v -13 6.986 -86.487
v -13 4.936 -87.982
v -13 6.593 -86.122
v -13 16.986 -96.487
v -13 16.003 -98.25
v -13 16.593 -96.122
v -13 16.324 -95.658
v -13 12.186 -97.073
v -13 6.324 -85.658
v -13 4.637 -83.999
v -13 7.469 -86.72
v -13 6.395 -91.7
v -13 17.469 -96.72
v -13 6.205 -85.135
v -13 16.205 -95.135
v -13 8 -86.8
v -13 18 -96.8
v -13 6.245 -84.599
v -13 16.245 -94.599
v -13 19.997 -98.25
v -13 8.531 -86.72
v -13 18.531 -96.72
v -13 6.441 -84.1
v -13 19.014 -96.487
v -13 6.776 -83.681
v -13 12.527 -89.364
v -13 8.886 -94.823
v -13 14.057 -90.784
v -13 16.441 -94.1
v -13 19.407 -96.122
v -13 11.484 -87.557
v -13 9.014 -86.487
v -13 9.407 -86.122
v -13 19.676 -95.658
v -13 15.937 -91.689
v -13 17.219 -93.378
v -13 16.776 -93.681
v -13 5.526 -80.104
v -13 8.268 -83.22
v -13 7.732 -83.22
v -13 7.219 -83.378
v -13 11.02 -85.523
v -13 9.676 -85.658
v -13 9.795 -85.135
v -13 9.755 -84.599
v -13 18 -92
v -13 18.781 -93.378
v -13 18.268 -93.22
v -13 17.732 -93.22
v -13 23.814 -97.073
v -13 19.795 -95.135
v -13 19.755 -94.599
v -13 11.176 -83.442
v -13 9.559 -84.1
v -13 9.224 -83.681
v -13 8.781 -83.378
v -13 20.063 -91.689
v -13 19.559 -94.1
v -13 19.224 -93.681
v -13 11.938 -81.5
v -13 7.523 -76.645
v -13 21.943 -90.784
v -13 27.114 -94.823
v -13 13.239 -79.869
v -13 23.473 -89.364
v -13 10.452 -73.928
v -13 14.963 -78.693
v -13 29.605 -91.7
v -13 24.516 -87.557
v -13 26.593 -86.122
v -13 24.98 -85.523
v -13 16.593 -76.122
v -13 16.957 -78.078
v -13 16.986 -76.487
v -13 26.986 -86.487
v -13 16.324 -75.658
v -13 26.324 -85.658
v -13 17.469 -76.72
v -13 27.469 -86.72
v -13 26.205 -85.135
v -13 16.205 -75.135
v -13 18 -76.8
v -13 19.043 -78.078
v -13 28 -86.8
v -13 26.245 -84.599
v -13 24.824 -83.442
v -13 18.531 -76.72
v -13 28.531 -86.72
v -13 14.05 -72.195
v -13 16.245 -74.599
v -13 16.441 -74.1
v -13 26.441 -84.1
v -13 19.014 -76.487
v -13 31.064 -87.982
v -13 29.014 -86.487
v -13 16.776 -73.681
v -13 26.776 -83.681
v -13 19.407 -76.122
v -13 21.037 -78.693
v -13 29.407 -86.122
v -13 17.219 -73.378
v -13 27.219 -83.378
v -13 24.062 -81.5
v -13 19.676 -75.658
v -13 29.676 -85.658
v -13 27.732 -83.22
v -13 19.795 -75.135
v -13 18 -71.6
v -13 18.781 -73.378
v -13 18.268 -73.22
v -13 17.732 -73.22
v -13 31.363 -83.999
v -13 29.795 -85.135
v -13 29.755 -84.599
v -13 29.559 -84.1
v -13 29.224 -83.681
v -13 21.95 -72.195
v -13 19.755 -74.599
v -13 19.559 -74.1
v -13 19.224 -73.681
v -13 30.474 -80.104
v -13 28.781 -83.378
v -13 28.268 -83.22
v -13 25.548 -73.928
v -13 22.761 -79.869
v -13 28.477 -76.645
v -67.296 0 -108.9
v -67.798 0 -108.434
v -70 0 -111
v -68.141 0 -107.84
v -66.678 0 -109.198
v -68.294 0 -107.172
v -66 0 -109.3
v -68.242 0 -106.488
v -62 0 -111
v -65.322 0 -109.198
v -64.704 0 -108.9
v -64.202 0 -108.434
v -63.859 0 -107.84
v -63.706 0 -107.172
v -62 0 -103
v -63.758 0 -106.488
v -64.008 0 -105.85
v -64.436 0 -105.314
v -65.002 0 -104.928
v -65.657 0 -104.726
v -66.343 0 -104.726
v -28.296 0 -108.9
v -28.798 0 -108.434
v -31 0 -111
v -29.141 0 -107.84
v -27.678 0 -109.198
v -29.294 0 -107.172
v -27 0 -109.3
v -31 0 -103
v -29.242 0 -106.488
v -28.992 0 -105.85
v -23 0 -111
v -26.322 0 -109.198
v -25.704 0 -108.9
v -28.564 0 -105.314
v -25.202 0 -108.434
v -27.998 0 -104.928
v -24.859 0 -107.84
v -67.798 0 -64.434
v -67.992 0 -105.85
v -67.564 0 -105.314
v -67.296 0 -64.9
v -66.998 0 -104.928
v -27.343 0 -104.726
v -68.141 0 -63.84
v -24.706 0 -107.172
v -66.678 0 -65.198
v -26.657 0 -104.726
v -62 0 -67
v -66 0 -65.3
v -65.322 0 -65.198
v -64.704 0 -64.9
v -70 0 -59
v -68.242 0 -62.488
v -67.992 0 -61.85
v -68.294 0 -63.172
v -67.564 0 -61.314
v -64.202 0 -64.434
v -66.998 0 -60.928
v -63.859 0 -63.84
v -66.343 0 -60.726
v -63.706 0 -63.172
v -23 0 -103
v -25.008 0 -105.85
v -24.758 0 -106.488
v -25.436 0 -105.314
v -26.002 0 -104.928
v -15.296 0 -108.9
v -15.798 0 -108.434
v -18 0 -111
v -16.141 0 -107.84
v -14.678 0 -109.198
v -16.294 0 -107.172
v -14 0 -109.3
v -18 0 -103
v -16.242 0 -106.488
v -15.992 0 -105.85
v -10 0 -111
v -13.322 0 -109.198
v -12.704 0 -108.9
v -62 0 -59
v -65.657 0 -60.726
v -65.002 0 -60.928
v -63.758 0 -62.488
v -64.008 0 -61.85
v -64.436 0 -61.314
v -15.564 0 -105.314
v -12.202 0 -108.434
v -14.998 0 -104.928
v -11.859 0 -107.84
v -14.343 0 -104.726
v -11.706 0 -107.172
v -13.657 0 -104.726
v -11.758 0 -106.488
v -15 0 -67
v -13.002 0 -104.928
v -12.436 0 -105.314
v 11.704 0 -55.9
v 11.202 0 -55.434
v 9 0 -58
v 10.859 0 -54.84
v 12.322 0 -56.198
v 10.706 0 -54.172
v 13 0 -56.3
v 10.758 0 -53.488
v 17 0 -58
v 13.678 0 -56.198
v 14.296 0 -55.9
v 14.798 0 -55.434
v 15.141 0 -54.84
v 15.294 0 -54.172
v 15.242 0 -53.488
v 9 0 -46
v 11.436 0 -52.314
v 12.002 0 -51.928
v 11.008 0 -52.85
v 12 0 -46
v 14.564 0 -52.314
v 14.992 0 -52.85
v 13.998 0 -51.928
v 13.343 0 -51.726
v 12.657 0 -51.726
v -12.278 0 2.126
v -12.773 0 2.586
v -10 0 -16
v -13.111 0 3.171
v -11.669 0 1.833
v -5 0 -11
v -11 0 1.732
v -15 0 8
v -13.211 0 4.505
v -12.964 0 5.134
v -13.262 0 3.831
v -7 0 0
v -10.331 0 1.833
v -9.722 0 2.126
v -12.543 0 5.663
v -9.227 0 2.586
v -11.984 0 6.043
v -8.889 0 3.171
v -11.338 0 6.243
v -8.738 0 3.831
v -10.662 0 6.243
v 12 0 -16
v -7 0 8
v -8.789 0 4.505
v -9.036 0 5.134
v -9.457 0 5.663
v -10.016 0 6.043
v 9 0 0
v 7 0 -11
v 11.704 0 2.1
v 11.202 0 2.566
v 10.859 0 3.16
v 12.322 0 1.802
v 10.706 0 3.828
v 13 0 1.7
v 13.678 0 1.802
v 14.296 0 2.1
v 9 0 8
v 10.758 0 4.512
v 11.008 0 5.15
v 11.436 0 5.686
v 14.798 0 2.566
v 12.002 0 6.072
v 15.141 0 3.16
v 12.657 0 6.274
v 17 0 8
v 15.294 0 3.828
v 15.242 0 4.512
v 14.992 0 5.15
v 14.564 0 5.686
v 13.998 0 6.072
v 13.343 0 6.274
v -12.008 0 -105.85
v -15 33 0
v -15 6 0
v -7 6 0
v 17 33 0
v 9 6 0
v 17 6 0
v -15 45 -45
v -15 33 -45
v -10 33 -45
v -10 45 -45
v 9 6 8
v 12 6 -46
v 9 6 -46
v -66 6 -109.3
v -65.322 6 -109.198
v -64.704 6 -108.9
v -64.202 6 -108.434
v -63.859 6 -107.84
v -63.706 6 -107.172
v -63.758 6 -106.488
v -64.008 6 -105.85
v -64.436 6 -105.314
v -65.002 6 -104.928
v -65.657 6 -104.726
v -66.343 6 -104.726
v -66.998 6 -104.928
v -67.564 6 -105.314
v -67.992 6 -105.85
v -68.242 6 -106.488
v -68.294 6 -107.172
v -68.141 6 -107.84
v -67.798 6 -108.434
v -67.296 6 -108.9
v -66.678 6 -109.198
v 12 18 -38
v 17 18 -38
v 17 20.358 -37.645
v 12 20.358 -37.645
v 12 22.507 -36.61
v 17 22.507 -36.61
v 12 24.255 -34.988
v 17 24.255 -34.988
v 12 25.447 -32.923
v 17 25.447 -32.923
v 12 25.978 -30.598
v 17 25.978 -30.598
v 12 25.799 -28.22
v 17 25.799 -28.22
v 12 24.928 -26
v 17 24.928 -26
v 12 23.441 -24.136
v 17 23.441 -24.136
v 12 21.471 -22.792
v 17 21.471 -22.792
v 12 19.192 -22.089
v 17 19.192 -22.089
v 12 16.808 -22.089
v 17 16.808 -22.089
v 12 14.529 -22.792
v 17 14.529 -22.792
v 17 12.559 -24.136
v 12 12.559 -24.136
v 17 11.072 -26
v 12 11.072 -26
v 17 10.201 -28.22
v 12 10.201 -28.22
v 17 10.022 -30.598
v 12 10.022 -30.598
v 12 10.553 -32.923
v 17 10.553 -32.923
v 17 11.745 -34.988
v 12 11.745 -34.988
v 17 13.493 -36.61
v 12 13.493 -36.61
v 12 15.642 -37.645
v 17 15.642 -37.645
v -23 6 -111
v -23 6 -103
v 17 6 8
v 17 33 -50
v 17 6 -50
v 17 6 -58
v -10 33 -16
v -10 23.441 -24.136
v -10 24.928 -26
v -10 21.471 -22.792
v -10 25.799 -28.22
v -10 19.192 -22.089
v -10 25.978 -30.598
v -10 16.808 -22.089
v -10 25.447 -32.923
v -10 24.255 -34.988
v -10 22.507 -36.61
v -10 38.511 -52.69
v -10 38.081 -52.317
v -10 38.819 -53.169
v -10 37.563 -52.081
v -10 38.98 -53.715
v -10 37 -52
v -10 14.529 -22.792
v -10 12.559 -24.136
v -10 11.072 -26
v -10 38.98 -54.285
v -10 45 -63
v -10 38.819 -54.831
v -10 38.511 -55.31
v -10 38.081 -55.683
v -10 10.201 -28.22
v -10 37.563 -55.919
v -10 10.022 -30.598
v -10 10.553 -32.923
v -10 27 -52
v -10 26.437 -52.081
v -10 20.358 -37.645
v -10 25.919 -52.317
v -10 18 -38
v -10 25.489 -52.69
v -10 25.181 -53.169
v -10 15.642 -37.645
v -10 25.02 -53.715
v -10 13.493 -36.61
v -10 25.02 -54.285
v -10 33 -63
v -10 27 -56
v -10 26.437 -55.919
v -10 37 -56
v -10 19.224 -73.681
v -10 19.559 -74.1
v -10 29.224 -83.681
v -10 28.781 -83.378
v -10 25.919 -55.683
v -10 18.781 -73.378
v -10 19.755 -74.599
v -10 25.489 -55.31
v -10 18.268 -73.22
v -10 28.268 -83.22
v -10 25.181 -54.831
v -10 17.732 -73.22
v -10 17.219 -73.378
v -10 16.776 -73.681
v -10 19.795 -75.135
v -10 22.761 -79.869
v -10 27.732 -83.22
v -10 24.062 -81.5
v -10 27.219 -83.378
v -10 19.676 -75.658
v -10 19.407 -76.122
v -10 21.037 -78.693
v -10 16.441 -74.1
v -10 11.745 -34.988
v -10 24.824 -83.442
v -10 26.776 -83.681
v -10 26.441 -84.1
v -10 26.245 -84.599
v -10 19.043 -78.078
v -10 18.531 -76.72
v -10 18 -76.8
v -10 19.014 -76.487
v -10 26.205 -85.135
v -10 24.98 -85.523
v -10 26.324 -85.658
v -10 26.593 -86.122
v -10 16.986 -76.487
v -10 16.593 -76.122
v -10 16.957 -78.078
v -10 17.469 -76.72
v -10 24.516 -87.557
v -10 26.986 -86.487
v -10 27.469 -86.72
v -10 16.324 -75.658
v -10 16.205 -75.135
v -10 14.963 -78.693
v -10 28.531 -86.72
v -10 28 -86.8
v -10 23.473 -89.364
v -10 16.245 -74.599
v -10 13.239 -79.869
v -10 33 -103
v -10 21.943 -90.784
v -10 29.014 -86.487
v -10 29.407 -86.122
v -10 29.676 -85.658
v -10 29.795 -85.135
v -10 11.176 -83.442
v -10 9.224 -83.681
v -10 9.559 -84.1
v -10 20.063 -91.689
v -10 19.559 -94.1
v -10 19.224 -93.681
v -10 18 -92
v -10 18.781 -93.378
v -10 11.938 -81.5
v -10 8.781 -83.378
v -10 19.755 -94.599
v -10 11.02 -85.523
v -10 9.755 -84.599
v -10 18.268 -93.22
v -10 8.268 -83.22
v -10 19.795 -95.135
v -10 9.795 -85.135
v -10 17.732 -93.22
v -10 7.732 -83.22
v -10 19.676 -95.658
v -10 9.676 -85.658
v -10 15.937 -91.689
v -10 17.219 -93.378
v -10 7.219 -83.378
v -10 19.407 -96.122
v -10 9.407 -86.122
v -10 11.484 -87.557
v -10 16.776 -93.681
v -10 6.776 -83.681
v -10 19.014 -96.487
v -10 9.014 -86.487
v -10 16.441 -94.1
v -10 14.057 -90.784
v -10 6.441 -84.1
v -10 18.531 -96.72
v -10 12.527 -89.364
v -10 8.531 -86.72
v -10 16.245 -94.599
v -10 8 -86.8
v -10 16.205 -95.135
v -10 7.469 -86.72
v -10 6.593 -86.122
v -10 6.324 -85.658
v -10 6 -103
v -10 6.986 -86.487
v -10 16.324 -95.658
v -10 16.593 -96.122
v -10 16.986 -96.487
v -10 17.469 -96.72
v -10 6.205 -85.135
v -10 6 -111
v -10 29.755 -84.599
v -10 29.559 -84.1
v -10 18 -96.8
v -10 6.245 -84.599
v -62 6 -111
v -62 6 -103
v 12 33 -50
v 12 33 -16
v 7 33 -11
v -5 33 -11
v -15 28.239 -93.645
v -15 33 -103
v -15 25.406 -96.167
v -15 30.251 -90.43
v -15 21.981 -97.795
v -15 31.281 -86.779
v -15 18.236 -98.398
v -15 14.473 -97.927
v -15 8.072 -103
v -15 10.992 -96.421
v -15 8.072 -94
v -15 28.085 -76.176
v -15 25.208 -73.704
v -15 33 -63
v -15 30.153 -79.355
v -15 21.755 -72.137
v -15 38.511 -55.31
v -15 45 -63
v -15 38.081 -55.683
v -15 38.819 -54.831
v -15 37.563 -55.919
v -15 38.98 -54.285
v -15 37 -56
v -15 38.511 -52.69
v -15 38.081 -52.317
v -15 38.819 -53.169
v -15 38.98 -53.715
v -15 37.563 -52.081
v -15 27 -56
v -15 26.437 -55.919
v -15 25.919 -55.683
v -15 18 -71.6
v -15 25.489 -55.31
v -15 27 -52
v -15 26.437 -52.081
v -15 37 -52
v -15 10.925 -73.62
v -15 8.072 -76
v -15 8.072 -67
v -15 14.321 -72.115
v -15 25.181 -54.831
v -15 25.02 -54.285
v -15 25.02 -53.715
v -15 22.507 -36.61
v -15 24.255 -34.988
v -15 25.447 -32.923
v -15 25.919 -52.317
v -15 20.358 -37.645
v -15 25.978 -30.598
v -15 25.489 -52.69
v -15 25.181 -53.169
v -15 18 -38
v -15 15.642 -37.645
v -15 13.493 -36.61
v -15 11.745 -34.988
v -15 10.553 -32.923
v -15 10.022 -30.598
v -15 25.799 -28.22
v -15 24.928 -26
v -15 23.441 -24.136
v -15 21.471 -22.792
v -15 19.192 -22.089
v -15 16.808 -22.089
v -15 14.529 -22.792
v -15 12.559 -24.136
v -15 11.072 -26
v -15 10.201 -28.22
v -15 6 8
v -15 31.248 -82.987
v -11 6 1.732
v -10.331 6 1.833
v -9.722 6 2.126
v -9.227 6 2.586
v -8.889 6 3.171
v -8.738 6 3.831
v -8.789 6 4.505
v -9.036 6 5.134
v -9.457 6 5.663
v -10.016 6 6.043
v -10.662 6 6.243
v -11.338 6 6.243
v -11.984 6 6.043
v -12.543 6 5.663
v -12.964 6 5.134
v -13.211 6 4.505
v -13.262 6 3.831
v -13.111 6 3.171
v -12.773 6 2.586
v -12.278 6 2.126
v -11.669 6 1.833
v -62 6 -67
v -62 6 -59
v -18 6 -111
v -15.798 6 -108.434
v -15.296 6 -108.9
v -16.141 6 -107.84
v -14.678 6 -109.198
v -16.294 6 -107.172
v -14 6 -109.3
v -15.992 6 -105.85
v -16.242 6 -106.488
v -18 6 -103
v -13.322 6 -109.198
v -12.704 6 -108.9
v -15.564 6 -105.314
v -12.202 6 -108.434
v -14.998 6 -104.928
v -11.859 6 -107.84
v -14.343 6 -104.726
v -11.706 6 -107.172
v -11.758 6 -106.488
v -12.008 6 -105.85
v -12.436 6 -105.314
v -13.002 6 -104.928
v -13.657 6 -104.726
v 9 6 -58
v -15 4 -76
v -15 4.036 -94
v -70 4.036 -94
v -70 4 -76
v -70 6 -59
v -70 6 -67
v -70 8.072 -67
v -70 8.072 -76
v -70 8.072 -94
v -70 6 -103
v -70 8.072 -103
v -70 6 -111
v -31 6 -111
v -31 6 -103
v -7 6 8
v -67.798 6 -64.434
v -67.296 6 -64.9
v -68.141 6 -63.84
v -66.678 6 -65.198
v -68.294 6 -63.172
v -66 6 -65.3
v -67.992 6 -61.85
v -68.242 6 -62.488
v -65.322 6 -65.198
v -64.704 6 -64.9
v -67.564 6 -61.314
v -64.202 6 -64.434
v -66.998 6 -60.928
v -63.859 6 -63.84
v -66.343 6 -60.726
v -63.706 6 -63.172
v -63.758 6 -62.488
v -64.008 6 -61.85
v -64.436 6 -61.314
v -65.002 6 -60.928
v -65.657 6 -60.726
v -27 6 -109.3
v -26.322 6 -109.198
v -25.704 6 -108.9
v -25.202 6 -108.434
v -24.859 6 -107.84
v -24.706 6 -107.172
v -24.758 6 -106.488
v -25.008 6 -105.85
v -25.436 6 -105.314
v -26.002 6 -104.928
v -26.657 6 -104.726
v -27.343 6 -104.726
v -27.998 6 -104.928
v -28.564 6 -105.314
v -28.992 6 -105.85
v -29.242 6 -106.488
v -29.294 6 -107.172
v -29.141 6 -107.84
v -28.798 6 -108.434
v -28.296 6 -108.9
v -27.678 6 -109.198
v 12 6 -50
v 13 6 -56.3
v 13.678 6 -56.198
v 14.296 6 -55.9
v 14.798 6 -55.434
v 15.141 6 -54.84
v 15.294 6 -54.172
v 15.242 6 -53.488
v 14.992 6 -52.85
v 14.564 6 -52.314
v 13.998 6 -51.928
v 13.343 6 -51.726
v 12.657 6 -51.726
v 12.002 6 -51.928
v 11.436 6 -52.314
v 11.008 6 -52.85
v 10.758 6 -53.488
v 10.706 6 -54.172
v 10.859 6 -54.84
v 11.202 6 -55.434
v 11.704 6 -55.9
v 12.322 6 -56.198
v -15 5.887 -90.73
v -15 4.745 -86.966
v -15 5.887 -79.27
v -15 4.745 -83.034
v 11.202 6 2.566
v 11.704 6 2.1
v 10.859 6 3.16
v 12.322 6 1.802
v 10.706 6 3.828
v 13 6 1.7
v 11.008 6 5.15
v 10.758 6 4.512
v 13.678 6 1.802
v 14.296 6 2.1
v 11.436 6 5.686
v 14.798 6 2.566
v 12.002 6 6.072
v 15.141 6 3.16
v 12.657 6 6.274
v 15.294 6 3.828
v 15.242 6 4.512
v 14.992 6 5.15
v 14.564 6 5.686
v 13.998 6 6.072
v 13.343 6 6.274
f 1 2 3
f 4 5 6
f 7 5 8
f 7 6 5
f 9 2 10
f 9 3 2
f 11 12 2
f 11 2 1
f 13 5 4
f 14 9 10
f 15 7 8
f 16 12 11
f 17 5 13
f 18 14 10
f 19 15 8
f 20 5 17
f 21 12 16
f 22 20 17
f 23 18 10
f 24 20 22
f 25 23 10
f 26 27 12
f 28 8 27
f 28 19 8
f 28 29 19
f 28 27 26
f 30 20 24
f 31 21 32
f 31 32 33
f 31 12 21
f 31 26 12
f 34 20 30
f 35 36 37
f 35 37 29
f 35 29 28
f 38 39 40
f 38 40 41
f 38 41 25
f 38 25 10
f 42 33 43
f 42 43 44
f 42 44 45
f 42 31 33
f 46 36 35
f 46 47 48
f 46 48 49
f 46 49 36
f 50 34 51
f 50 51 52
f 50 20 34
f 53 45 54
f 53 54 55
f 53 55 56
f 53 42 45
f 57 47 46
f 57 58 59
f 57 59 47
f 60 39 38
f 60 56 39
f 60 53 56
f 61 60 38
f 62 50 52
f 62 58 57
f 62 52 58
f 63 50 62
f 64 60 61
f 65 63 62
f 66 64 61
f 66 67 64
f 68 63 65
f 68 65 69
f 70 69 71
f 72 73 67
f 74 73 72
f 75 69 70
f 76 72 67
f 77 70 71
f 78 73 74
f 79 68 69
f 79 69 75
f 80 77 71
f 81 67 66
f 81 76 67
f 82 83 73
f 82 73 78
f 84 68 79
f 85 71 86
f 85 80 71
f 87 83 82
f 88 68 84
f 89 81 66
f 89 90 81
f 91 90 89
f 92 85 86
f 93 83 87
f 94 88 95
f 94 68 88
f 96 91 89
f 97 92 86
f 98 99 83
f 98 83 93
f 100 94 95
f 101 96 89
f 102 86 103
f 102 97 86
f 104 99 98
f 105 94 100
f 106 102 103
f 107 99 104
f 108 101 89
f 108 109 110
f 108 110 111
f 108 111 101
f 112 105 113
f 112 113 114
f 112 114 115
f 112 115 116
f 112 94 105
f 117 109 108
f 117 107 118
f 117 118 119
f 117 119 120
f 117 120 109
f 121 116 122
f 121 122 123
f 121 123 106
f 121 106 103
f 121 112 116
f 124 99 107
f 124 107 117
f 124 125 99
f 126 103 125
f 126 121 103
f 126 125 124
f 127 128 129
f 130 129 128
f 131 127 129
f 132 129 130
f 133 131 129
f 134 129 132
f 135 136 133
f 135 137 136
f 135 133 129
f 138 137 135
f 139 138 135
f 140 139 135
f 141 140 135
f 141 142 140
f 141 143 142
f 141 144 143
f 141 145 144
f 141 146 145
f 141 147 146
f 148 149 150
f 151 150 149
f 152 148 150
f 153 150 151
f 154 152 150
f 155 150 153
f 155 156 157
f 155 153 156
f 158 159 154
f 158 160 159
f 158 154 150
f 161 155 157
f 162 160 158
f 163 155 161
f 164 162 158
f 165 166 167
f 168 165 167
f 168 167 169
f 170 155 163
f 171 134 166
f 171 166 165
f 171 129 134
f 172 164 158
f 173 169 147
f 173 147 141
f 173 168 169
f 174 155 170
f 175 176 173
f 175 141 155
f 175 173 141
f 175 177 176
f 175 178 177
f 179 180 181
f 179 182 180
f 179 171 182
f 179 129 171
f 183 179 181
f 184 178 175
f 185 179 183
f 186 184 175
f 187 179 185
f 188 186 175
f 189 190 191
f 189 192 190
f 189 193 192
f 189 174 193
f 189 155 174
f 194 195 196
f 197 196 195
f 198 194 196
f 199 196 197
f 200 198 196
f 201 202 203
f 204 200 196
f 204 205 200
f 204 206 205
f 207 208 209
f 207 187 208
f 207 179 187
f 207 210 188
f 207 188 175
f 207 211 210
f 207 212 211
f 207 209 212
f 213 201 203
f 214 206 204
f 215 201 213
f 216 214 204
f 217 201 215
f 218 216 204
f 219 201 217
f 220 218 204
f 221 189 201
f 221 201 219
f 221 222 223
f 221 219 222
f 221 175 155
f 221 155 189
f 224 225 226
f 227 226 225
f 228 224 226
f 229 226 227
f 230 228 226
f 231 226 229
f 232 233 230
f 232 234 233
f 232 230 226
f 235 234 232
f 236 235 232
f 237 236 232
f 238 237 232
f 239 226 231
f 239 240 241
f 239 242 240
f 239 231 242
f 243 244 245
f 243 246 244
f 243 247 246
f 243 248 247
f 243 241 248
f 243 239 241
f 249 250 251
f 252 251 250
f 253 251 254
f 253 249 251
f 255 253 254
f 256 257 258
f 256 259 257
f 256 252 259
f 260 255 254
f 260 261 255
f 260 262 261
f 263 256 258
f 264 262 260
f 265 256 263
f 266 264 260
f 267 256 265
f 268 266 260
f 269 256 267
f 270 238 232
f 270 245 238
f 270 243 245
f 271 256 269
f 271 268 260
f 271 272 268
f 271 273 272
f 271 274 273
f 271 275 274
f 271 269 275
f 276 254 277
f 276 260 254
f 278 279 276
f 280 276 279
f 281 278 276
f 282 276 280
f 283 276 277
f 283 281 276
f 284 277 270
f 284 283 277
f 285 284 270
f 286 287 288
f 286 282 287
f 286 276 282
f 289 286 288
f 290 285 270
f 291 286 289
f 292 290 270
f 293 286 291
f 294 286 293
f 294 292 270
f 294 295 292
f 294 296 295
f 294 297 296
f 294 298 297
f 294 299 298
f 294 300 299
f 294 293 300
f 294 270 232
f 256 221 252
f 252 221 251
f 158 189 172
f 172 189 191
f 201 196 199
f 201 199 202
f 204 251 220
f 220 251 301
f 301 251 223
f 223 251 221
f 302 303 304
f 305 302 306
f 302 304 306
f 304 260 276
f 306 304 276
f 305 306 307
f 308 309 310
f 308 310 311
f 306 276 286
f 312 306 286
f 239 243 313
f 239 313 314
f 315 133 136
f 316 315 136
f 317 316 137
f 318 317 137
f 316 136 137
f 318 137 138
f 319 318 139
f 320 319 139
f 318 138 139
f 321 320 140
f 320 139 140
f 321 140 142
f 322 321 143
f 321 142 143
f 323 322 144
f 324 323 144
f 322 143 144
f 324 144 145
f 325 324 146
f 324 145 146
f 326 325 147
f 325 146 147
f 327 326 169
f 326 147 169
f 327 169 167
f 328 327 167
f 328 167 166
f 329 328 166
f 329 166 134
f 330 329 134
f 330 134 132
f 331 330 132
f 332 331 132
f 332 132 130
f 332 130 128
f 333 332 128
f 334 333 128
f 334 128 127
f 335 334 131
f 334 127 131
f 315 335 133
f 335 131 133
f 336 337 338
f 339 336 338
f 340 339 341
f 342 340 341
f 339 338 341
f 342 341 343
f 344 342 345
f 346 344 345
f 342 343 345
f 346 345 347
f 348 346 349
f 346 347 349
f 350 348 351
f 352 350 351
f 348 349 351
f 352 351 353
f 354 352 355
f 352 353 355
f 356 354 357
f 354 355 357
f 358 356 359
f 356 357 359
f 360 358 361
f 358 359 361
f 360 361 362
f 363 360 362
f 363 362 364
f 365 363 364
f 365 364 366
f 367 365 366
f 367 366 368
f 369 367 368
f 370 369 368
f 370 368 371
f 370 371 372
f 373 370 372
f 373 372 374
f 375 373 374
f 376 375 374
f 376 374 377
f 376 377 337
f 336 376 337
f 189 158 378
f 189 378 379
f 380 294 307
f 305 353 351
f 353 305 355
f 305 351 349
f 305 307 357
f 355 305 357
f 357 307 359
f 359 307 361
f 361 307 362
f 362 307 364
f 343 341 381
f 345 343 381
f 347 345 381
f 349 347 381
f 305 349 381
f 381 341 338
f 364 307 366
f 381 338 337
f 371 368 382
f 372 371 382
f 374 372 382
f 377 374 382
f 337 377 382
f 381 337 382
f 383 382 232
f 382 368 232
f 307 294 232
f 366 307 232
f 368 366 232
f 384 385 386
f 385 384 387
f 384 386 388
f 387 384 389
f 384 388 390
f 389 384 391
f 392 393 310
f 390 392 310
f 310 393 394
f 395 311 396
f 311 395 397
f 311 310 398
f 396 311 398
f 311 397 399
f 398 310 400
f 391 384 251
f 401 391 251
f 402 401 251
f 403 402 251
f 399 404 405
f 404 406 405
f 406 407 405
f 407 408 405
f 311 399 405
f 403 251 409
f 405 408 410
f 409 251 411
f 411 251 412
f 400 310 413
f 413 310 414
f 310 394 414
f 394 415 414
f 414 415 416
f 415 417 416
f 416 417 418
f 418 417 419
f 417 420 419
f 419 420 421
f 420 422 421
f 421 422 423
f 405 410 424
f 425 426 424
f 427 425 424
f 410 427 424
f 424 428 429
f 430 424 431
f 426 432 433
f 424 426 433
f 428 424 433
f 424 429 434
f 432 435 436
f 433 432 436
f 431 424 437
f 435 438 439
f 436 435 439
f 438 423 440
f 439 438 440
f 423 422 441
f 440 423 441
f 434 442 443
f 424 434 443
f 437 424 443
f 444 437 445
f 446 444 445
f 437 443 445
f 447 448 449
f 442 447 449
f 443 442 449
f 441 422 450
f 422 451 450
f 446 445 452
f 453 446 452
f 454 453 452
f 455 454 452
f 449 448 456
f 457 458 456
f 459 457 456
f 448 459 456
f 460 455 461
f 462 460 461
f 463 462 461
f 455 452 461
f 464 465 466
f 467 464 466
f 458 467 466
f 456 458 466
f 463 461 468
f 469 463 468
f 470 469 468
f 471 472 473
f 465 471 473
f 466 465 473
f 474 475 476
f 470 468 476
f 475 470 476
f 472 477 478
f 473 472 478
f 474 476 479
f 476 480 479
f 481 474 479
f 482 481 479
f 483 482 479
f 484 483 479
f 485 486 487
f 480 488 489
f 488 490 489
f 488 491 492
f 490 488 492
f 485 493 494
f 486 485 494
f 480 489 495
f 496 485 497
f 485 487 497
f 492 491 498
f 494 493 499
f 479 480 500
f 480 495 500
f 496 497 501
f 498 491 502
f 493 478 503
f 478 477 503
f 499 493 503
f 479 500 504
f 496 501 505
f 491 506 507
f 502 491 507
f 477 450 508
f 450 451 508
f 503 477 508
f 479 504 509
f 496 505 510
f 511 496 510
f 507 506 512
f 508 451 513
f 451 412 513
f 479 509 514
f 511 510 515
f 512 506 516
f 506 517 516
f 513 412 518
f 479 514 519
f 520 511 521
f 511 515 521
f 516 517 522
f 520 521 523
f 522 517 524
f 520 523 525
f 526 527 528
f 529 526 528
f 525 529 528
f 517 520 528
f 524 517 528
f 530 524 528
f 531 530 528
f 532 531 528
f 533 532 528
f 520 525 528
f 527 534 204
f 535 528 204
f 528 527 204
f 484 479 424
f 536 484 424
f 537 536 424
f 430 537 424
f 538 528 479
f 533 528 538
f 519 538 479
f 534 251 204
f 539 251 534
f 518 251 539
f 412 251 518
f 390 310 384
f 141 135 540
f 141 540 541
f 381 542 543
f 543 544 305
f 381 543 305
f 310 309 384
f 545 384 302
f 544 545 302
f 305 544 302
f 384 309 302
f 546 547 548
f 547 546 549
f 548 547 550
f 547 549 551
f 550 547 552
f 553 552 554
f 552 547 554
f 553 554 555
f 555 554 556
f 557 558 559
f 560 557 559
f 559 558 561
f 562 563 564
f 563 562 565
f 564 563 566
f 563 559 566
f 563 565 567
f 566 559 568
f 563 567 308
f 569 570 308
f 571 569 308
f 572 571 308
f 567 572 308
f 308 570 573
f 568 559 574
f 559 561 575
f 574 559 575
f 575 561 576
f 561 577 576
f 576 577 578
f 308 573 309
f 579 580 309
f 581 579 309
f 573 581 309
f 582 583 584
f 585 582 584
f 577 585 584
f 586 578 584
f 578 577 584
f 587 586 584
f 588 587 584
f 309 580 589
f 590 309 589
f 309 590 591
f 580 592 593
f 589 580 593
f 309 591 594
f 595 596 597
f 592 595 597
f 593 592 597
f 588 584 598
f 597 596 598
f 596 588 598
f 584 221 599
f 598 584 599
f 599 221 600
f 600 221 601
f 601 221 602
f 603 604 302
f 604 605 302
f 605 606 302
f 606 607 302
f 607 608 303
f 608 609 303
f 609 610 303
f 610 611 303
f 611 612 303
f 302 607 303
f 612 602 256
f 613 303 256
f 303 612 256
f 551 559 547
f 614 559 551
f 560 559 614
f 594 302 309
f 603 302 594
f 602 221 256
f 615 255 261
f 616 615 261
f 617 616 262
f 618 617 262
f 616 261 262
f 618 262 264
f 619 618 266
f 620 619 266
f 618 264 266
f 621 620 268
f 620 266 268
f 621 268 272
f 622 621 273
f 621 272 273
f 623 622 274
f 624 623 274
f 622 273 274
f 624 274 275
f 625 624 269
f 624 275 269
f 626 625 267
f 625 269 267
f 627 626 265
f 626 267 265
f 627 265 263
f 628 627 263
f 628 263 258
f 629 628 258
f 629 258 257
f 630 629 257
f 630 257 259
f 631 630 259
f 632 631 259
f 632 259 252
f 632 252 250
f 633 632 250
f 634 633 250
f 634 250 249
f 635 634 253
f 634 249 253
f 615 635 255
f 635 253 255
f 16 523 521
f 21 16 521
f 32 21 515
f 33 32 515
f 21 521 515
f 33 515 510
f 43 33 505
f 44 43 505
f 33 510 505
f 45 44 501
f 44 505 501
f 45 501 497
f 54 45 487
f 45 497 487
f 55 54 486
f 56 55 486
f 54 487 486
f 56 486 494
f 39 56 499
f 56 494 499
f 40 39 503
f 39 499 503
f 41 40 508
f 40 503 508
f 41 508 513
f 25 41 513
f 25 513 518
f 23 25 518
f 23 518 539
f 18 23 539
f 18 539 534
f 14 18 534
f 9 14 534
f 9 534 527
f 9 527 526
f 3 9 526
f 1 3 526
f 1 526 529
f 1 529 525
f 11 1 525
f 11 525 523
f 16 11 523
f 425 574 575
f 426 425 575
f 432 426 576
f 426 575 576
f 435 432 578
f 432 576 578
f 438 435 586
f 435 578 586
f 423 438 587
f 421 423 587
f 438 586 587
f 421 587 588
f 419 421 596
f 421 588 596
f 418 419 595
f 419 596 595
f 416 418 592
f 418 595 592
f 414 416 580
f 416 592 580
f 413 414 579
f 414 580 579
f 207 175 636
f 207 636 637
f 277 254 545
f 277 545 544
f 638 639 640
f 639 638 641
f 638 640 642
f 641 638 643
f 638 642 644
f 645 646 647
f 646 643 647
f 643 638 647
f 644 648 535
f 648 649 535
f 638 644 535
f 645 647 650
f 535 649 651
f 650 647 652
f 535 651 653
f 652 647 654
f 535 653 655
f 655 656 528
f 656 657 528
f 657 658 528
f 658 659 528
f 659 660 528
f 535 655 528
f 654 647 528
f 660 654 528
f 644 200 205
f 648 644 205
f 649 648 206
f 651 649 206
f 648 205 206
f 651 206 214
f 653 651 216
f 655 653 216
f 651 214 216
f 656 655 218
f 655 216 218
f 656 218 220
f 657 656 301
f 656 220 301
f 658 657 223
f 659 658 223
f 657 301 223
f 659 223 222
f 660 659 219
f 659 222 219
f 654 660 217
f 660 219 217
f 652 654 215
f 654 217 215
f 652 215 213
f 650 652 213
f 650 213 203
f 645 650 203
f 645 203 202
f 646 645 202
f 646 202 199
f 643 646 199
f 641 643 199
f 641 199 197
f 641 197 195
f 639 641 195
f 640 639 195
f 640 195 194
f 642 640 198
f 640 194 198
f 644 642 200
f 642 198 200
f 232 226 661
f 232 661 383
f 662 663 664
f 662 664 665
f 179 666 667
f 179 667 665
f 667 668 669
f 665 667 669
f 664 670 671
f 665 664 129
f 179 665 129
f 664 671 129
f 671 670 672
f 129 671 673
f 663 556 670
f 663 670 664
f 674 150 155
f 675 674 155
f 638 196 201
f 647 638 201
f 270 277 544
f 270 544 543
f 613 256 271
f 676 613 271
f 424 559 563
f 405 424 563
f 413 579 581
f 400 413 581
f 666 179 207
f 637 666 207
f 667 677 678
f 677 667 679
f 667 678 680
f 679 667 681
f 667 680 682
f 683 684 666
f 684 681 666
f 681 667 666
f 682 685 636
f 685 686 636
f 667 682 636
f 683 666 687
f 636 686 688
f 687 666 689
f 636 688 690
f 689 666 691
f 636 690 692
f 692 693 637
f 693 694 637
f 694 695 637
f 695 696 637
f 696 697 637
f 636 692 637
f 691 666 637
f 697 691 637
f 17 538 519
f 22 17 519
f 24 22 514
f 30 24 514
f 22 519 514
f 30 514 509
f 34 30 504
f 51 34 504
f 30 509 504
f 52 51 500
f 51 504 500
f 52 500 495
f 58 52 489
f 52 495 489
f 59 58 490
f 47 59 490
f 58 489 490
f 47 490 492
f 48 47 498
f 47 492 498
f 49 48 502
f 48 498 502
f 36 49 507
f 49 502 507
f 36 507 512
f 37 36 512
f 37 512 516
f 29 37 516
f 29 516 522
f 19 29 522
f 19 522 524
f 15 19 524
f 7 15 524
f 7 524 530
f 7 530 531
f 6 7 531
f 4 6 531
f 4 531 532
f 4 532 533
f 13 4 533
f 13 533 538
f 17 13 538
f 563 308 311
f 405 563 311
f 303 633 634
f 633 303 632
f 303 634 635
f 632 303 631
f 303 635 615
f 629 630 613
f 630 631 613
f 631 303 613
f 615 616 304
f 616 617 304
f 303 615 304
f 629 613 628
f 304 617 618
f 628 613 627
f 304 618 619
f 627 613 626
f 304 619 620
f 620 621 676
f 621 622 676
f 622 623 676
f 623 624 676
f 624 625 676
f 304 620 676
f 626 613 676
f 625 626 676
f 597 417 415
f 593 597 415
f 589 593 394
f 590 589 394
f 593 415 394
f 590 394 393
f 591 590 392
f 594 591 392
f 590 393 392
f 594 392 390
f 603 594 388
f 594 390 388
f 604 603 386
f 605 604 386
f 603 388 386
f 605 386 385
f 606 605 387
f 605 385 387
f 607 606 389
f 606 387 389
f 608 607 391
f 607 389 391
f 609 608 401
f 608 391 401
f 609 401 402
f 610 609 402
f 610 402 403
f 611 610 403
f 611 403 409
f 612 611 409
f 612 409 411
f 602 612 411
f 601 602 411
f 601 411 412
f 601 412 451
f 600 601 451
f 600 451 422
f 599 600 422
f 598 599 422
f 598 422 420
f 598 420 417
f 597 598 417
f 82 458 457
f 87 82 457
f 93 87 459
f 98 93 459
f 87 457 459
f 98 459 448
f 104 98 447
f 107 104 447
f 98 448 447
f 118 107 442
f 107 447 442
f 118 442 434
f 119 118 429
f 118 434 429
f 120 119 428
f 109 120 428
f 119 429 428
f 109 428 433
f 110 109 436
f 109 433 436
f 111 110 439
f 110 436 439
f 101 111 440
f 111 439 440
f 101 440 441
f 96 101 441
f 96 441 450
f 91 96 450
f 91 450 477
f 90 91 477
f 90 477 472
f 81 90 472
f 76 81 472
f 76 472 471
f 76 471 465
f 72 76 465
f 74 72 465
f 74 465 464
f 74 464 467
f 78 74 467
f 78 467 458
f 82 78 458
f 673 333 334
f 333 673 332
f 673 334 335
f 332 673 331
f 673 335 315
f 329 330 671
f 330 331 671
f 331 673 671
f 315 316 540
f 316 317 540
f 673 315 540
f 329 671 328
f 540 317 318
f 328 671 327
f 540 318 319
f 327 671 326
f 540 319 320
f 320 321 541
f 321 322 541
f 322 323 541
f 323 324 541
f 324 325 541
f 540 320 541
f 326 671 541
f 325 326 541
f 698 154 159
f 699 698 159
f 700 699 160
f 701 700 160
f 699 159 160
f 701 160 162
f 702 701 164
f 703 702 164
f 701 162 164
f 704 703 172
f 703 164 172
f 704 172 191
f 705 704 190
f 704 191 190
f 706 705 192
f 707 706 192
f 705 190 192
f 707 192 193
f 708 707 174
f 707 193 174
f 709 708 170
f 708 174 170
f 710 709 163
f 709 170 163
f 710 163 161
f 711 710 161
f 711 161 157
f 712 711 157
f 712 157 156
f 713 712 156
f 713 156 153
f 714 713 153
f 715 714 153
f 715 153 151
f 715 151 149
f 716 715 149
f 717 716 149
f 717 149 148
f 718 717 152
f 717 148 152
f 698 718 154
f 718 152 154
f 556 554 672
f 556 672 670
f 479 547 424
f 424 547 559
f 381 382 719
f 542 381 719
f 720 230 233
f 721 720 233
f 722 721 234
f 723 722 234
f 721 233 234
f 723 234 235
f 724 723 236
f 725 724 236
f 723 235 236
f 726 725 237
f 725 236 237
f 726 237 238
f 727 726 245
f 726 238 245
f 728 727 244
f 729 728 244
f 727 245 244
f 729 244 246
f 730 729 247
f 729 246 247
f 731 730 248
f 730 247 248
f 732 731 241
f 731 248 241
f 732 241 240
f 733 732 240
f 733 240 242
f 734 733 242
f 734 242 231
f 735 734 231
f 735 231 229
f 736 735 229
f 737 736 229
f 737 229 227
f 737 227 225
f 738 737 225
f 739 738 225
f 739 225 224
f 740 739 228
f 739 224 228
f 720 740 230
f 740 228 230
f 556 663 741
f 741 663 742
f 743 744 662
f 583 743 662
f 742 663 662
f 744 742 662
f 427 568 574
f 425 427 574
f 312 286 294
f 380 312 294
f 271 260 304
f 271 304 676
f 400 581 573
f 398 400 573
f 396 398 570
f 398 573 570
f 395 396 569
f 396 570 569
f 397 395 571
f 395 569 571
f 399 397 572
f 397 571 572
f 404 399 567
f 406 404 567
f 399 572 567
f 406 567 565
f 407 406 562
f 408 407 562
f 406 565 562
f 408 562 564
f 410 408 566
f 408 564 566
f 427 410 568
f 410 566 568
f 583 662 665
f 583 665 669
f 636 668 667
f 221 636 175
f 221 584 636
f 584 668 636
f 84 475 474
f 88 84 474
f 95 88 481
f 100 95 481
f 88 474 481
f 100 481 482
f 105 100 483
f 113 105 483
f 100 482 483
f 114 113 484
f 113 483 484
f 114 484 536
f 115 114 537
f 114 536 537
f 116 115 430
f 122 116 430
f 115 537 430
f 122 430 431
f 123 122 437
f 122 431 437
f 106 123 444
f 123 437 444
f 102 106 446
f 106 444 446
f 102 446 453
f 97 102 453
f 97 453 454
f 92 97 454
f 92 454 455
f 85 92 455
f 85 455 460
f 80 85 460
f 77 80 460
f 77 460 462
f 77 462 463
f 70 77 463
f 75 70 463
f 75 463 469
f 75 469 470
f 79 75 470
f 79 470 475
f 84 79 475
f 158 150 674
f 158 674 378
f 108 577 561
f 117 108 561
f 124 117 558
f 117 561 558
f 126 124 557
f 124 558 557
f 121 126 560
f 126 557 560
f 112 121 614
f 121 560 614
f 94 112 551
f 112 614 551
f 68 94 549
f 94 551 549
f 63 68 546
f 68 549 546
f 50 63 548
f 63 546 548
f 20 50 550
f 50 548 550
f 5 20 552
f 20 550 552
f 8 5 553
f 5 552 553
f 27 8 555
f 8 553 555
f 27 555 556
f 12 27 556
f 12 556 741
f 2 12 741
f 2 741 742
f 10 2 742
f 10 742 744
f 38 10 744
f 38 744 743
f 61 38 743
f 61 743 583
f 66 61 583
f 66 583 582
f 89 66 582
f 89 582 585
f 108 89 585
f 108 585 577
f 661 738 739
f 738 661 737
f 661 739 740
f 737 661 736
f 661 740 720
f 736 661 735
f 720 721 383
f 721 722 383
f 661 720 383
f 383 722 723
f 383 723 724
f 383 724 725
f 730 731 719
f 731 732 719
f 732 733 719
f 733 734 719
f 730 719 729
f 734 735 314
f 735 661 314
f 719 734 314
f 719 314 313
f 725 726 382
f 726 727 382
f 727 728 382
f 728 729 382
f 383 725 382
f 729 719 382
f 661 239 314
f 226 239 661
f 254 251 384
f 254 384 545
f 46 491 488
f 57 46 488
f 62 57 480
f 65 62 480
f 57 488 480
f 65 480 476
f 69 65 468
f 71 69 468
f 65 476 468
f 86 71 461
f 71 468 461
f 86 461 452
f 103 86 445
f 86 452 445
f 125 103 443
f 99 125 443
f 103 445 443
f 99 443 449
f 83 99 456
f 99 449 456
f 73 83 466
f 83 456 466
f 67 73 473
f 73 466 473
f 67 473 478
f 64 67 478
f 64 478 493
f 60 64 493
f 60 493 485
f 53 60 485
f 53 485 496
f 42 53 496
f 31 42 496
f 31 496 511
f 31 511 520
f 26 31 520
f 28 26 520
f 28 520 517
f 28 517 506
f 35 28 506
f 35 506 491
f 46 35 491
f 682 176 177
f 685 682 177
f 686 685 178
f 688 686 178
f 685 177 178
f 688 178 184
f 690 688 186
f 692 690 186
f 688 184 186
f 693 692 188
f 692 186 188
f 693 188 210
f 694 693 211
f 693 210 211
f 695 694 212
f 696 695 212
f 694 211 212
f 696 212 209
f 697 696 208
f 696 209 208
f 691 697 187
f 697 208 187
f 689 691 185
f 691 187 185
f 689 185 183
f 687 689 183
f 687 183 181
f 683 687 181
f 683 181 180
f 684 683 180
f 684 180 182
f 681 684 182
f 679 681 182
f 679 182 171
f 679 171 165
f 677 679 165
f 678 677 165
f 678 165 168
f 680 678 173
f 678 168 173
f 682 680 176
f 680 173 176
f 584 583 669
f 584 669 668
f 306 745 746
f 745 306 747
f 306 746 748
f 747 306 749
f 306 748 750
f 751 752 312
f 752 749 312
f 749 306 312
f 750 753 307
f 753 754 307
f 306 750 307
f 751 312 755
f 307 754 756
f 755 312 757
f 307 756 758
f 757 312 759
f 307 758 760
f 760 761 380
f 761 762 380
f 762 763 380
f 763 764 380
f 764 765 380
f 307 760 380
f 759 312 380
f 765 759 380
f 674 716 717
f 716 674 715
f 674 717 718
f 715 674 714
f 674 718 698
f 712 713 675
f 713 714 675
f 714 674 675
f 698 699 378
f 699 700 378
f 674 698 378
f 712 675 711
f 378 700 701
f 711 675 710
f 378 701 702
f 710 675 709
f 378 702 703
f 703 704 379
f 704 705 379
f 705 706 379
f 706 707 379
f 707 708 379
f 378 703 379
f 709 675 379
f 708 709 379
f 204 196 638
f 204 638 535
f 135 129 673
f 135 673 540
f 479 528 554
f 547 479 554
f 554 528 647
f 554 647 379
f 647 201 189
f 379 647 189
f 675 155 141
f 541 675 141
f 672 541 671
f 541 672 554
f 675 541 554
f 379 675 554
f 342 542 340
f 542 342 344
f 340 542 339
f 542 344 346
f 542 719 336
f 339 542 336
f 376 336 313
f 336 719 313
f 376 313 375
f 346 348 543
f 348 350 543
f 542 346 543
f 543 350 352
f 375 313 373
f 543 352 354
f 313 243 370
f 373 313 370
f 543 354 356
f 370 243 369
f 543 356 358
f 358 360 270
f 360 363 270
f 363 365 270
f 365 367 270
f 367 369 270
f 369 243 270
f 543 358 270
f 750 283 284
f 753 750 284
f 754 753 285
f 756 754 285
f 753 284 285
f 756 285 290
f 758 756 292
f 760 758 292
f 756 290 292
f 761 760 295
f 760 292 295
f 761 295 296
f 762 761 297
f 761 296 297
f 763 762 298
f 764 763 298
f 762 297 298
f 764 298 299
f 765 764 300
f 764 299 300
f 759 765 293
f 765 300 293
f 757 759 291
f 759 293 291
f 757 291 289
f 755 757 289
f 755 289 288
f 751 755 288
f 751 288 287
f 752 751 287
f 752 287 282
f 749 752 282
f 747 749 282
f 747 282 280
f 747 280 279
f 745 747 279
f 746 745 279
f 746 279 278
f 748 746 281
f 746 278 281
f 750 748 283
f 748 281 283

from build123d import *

# Parameters (mm, degrees)
BOSS_EXTRU_1_DEPTH      = 45
ESQUISSE2_R             = 8
ENL_V_MAT_EXTRU_1_DEPTH = 50
ENL_V_MAT_EXTRU_2_DEPTH = 50
ESQUISSE4_R             = 1.8
ESQUISSE4_R_2           = 7
ENL_V_MAT_EXTRU_3_DEPTH = 5
BOSS_EXTRU_2_DEPTH      = 60
BOSS_EXTRU_3_DEPTH      = 45
ESQUISSE11_W            = 8
ESQUISSE11_H            = 8
ESQUISSE11_R            = 2.3
ESQUISSE11_R_2          = 2.268048231
BOSS_EXTRU_6_DEPTH      = 6
ESQUISSE12_W            = 40
ESQUISSE12_H            = 12
ESQUISSE12_W_2          = 45
ENL_V_MAT_EXTRU_5_DEPTH = 50
ESQUISSE13_W            = 5
ESQUISSE13_H            = 12
ENL_V_MAT_EXTRU_6_DEPTH = 20
ESQUISSE25_R            = 13.4
ENL_V_MAT_EXTRU_8_DEPTH = 2


with BuildPart() as part:
    # Esquisse1 → Boss.-Extru.1 (new body)
    with BuildSketch(Plane(origin=(0, 0, 0), x_dir=(1, 0, 0), z_dir=(0, 1, 0))):
        Polygon((-15, 0), (17, 0), (17, 50), (12, 50), (12, 6), (-10, 6), (-10, 103), (-15, 103), align=None)
    extrude(amount=BOSS_EXTRU_1_DEPTH)

    # Esquisse2 → Enlèv. mat.-Extru.1 (cut)
    with BuildSketch(Plane(origin=(17, 0, 0), x_dir=(0, 0, -1), z_dir=(1, 0, 0))):
        with Locations((30, 18)):
            Circle(ESQUISSE2_R)
    extrude(amount=-ENL_V_MAT_EXTRU_1_DEPTH, mode=Mode.SUBTRACT)

    # Esquisse3 → Enlèv. mat.-Extru.2 (cut)
    with BuildSketch(Plane.ZY.offset(15)):
        with BuildLine():
            ThreePointArc((-52, 37), (-54, 39), (-56, 37))
            Line((-56, 37), (-56, 27))
            ThreePointArc((-56, 27), (-54, 25), (-52, 27))
            Line((-52, 27), (-52, 37))
        make_face()
    extrude(amount=-ENL_V_MAT_EXTRU_2_DEPTH, mode=Mode.SUBTRACT)

    # Esquisse4 → Enlèv. mat.-Extru.3 (cut)
    with BuildSketch(Plane(origin=(-10, 0, 0), x_dir=(0, 0, -1), z_dir=(1, 0, 0))):
        with Locations((75, 18)):
            Circle(ESQUISSE4_R)
        with Locations((85, 8)):
            Circle(ESQUISSE4_R)
        with Locations((95, 18)):
            Circle(ESQUISSE4_R)
        with Locations((85, 28)):
            Circle(ESQUISSE4_R)
        with Locations((85, 18)):
            Circle(ESQUISSE4_R_2)
    extrude(amount=-ENL_V_MAT_EXTRU_3_DEPTH, mode=Mode.SUBTRACT)

    # Esquisse4<4> → Boss.-Extru.2 (add)
    with BuildSketch(Plane(origin=(-10, 0, 0), x_dir=(0, 0, -1), z_dir=(1, 0, 0))):
        Polygon((103, 0), (103, 8.072261083), (94, 8.072261083), (94, 4.036130542), (76, 4), (76, 8.072261083), (67, 8.072261083), (67, 0), align=None)
    extrude(amount=-BOSS_EXTRU_2_DEPTH)

    # Esquisse6 → Boss.-Extru.3 (add)
    with BuildSketch(Plane.XZ):
        Polygon((-5, -6), (-10, -6), (-10, -16), (-5, -11), (7, -11), (12, -16), (12, -6), (7, -6), align=None)
    extrude(amount=-BOSS_EXTRU_3_DEPTH)

    # Esquisse11 → Boss.-Extru.6 (add)
    # profile 1 of 7: a face of its own
    with BuildSketch(Plane.XZ):
        with Locations((13, 4)):
            Rectangle(ESQUISSE11_W, ESQUISSE11_H)
        with Locations((13, 4)):
            Circle(ESQUISSE11_R, mode=Mode.SUBTRACT)
    # profile 2 of 7: a face of its own
    with BuildSketch(Plane.XZ):
        with Locations((-11, 4)):
            Rectangle(ESQUISSE11_W, ESQUISSE11_H)
        with Locations((-11, 4)):
            Circle(ESQUISSE11_R_2, mode=Mode.SUBTRACT)
    # profile 3 of 7: a face of its own
    with BuildSketch(Plane.XZ):
        Polygon((17, -58), (17, -50), (12, -50), (12, -46), (9, -46), (9, -58), align=None)
        with Locations((13, -54)):
            Circle(ESQUISSE11_R, mode=Mode.SUBTRACT)
    # profile 4 of 7: a face of its own
    with BuildSketch(Plane.XZ):
        with Locations((-66, -63)):
            Rectangle(ESQUISSE11_W, ESQUISSE11_H)
        with Locations((-66, -63)):
            Circle(ESQUISSE11_R, mode=Mode.SUBTRACT)
    # profile 5 of 7: a face of its own
    with BuildSketch(Plane.XZ):
        with Locations((-66, -107)):
            Rectangle(ESQUISSE11_W, ESQUISSE11_H)
        with Locations((-66, -107)):
            Circle(ESQUISSE11_R, mode=Mode.SUBTRACT)
    # profile 6 of 7: a face of its own
    with BuildSketch(Plane.XZ):
        with Locations((-27, -107)):
            Rectangle(ESQUISSE11_W, ESQUISSE11_H)
        with Locations((-27, -107)):
            Circle(ESQUISSE11_R, mode=Mode.SUBTRACT)
    # profile 7 of 7: a face of its own
    with BuildSketch(Plane.XZ):
        with Locations((-14, -107)):
            Rectangle(ESQUISSE11_W, ESQUISSE11_H)
        with Locations((-14, -107)):
            Circle(ESQUISSE11_R, mode=Mode.SUBTRACT)
    extrude(amount=-BOSS_EXTRU_6_DEPTH)

    # Esquisse12 → Enlèv. mat.-Extru.5 (cut)
    with BuildSketch(Plane.ZY.offset(15)):
        with Locations((-83, 39)):
            Rectangle(ESQUISSE12_W, ESQUISSE12_H)
        with Locations((-22.5, 39)):
            Rectangle(ESQUISSE12_W_2, ESQUISSE12_H)
    extrude(amount=-ENL_V_MAT_EXTRU_5_DEPTH, mode=Mode.SUBTRACT)

    # Esquisse13 → Enlèv. mat.-Extru.6 (cut)
    with BuildSketch(Plane(origin=(17, 0, 0), x_dir=(0, 0, -1), z_dir=(1, 0, 0))):
        with Locations((47.5, 39)):
            Rectangle(ESQUISSE13_W, ESQUISSE13_H)
    extrude(amount=-ENL_V_MAT_EXTRU_6_DEPTH, mode=Mode.SUBTRACT)

    # Esquisse25 → Enlèv. mat.-Extru.8 (cut)
    with BuildSketch(Plane.ZY.offset(15)):
        with Locations((-85, 18)):
            Circle(ESQUISSE25_R)
    extrude(amount=-ENL_V_MAT_EXTRU_8_DEPTH, mode=Mode.SUBTRACT)


solid = part.part
